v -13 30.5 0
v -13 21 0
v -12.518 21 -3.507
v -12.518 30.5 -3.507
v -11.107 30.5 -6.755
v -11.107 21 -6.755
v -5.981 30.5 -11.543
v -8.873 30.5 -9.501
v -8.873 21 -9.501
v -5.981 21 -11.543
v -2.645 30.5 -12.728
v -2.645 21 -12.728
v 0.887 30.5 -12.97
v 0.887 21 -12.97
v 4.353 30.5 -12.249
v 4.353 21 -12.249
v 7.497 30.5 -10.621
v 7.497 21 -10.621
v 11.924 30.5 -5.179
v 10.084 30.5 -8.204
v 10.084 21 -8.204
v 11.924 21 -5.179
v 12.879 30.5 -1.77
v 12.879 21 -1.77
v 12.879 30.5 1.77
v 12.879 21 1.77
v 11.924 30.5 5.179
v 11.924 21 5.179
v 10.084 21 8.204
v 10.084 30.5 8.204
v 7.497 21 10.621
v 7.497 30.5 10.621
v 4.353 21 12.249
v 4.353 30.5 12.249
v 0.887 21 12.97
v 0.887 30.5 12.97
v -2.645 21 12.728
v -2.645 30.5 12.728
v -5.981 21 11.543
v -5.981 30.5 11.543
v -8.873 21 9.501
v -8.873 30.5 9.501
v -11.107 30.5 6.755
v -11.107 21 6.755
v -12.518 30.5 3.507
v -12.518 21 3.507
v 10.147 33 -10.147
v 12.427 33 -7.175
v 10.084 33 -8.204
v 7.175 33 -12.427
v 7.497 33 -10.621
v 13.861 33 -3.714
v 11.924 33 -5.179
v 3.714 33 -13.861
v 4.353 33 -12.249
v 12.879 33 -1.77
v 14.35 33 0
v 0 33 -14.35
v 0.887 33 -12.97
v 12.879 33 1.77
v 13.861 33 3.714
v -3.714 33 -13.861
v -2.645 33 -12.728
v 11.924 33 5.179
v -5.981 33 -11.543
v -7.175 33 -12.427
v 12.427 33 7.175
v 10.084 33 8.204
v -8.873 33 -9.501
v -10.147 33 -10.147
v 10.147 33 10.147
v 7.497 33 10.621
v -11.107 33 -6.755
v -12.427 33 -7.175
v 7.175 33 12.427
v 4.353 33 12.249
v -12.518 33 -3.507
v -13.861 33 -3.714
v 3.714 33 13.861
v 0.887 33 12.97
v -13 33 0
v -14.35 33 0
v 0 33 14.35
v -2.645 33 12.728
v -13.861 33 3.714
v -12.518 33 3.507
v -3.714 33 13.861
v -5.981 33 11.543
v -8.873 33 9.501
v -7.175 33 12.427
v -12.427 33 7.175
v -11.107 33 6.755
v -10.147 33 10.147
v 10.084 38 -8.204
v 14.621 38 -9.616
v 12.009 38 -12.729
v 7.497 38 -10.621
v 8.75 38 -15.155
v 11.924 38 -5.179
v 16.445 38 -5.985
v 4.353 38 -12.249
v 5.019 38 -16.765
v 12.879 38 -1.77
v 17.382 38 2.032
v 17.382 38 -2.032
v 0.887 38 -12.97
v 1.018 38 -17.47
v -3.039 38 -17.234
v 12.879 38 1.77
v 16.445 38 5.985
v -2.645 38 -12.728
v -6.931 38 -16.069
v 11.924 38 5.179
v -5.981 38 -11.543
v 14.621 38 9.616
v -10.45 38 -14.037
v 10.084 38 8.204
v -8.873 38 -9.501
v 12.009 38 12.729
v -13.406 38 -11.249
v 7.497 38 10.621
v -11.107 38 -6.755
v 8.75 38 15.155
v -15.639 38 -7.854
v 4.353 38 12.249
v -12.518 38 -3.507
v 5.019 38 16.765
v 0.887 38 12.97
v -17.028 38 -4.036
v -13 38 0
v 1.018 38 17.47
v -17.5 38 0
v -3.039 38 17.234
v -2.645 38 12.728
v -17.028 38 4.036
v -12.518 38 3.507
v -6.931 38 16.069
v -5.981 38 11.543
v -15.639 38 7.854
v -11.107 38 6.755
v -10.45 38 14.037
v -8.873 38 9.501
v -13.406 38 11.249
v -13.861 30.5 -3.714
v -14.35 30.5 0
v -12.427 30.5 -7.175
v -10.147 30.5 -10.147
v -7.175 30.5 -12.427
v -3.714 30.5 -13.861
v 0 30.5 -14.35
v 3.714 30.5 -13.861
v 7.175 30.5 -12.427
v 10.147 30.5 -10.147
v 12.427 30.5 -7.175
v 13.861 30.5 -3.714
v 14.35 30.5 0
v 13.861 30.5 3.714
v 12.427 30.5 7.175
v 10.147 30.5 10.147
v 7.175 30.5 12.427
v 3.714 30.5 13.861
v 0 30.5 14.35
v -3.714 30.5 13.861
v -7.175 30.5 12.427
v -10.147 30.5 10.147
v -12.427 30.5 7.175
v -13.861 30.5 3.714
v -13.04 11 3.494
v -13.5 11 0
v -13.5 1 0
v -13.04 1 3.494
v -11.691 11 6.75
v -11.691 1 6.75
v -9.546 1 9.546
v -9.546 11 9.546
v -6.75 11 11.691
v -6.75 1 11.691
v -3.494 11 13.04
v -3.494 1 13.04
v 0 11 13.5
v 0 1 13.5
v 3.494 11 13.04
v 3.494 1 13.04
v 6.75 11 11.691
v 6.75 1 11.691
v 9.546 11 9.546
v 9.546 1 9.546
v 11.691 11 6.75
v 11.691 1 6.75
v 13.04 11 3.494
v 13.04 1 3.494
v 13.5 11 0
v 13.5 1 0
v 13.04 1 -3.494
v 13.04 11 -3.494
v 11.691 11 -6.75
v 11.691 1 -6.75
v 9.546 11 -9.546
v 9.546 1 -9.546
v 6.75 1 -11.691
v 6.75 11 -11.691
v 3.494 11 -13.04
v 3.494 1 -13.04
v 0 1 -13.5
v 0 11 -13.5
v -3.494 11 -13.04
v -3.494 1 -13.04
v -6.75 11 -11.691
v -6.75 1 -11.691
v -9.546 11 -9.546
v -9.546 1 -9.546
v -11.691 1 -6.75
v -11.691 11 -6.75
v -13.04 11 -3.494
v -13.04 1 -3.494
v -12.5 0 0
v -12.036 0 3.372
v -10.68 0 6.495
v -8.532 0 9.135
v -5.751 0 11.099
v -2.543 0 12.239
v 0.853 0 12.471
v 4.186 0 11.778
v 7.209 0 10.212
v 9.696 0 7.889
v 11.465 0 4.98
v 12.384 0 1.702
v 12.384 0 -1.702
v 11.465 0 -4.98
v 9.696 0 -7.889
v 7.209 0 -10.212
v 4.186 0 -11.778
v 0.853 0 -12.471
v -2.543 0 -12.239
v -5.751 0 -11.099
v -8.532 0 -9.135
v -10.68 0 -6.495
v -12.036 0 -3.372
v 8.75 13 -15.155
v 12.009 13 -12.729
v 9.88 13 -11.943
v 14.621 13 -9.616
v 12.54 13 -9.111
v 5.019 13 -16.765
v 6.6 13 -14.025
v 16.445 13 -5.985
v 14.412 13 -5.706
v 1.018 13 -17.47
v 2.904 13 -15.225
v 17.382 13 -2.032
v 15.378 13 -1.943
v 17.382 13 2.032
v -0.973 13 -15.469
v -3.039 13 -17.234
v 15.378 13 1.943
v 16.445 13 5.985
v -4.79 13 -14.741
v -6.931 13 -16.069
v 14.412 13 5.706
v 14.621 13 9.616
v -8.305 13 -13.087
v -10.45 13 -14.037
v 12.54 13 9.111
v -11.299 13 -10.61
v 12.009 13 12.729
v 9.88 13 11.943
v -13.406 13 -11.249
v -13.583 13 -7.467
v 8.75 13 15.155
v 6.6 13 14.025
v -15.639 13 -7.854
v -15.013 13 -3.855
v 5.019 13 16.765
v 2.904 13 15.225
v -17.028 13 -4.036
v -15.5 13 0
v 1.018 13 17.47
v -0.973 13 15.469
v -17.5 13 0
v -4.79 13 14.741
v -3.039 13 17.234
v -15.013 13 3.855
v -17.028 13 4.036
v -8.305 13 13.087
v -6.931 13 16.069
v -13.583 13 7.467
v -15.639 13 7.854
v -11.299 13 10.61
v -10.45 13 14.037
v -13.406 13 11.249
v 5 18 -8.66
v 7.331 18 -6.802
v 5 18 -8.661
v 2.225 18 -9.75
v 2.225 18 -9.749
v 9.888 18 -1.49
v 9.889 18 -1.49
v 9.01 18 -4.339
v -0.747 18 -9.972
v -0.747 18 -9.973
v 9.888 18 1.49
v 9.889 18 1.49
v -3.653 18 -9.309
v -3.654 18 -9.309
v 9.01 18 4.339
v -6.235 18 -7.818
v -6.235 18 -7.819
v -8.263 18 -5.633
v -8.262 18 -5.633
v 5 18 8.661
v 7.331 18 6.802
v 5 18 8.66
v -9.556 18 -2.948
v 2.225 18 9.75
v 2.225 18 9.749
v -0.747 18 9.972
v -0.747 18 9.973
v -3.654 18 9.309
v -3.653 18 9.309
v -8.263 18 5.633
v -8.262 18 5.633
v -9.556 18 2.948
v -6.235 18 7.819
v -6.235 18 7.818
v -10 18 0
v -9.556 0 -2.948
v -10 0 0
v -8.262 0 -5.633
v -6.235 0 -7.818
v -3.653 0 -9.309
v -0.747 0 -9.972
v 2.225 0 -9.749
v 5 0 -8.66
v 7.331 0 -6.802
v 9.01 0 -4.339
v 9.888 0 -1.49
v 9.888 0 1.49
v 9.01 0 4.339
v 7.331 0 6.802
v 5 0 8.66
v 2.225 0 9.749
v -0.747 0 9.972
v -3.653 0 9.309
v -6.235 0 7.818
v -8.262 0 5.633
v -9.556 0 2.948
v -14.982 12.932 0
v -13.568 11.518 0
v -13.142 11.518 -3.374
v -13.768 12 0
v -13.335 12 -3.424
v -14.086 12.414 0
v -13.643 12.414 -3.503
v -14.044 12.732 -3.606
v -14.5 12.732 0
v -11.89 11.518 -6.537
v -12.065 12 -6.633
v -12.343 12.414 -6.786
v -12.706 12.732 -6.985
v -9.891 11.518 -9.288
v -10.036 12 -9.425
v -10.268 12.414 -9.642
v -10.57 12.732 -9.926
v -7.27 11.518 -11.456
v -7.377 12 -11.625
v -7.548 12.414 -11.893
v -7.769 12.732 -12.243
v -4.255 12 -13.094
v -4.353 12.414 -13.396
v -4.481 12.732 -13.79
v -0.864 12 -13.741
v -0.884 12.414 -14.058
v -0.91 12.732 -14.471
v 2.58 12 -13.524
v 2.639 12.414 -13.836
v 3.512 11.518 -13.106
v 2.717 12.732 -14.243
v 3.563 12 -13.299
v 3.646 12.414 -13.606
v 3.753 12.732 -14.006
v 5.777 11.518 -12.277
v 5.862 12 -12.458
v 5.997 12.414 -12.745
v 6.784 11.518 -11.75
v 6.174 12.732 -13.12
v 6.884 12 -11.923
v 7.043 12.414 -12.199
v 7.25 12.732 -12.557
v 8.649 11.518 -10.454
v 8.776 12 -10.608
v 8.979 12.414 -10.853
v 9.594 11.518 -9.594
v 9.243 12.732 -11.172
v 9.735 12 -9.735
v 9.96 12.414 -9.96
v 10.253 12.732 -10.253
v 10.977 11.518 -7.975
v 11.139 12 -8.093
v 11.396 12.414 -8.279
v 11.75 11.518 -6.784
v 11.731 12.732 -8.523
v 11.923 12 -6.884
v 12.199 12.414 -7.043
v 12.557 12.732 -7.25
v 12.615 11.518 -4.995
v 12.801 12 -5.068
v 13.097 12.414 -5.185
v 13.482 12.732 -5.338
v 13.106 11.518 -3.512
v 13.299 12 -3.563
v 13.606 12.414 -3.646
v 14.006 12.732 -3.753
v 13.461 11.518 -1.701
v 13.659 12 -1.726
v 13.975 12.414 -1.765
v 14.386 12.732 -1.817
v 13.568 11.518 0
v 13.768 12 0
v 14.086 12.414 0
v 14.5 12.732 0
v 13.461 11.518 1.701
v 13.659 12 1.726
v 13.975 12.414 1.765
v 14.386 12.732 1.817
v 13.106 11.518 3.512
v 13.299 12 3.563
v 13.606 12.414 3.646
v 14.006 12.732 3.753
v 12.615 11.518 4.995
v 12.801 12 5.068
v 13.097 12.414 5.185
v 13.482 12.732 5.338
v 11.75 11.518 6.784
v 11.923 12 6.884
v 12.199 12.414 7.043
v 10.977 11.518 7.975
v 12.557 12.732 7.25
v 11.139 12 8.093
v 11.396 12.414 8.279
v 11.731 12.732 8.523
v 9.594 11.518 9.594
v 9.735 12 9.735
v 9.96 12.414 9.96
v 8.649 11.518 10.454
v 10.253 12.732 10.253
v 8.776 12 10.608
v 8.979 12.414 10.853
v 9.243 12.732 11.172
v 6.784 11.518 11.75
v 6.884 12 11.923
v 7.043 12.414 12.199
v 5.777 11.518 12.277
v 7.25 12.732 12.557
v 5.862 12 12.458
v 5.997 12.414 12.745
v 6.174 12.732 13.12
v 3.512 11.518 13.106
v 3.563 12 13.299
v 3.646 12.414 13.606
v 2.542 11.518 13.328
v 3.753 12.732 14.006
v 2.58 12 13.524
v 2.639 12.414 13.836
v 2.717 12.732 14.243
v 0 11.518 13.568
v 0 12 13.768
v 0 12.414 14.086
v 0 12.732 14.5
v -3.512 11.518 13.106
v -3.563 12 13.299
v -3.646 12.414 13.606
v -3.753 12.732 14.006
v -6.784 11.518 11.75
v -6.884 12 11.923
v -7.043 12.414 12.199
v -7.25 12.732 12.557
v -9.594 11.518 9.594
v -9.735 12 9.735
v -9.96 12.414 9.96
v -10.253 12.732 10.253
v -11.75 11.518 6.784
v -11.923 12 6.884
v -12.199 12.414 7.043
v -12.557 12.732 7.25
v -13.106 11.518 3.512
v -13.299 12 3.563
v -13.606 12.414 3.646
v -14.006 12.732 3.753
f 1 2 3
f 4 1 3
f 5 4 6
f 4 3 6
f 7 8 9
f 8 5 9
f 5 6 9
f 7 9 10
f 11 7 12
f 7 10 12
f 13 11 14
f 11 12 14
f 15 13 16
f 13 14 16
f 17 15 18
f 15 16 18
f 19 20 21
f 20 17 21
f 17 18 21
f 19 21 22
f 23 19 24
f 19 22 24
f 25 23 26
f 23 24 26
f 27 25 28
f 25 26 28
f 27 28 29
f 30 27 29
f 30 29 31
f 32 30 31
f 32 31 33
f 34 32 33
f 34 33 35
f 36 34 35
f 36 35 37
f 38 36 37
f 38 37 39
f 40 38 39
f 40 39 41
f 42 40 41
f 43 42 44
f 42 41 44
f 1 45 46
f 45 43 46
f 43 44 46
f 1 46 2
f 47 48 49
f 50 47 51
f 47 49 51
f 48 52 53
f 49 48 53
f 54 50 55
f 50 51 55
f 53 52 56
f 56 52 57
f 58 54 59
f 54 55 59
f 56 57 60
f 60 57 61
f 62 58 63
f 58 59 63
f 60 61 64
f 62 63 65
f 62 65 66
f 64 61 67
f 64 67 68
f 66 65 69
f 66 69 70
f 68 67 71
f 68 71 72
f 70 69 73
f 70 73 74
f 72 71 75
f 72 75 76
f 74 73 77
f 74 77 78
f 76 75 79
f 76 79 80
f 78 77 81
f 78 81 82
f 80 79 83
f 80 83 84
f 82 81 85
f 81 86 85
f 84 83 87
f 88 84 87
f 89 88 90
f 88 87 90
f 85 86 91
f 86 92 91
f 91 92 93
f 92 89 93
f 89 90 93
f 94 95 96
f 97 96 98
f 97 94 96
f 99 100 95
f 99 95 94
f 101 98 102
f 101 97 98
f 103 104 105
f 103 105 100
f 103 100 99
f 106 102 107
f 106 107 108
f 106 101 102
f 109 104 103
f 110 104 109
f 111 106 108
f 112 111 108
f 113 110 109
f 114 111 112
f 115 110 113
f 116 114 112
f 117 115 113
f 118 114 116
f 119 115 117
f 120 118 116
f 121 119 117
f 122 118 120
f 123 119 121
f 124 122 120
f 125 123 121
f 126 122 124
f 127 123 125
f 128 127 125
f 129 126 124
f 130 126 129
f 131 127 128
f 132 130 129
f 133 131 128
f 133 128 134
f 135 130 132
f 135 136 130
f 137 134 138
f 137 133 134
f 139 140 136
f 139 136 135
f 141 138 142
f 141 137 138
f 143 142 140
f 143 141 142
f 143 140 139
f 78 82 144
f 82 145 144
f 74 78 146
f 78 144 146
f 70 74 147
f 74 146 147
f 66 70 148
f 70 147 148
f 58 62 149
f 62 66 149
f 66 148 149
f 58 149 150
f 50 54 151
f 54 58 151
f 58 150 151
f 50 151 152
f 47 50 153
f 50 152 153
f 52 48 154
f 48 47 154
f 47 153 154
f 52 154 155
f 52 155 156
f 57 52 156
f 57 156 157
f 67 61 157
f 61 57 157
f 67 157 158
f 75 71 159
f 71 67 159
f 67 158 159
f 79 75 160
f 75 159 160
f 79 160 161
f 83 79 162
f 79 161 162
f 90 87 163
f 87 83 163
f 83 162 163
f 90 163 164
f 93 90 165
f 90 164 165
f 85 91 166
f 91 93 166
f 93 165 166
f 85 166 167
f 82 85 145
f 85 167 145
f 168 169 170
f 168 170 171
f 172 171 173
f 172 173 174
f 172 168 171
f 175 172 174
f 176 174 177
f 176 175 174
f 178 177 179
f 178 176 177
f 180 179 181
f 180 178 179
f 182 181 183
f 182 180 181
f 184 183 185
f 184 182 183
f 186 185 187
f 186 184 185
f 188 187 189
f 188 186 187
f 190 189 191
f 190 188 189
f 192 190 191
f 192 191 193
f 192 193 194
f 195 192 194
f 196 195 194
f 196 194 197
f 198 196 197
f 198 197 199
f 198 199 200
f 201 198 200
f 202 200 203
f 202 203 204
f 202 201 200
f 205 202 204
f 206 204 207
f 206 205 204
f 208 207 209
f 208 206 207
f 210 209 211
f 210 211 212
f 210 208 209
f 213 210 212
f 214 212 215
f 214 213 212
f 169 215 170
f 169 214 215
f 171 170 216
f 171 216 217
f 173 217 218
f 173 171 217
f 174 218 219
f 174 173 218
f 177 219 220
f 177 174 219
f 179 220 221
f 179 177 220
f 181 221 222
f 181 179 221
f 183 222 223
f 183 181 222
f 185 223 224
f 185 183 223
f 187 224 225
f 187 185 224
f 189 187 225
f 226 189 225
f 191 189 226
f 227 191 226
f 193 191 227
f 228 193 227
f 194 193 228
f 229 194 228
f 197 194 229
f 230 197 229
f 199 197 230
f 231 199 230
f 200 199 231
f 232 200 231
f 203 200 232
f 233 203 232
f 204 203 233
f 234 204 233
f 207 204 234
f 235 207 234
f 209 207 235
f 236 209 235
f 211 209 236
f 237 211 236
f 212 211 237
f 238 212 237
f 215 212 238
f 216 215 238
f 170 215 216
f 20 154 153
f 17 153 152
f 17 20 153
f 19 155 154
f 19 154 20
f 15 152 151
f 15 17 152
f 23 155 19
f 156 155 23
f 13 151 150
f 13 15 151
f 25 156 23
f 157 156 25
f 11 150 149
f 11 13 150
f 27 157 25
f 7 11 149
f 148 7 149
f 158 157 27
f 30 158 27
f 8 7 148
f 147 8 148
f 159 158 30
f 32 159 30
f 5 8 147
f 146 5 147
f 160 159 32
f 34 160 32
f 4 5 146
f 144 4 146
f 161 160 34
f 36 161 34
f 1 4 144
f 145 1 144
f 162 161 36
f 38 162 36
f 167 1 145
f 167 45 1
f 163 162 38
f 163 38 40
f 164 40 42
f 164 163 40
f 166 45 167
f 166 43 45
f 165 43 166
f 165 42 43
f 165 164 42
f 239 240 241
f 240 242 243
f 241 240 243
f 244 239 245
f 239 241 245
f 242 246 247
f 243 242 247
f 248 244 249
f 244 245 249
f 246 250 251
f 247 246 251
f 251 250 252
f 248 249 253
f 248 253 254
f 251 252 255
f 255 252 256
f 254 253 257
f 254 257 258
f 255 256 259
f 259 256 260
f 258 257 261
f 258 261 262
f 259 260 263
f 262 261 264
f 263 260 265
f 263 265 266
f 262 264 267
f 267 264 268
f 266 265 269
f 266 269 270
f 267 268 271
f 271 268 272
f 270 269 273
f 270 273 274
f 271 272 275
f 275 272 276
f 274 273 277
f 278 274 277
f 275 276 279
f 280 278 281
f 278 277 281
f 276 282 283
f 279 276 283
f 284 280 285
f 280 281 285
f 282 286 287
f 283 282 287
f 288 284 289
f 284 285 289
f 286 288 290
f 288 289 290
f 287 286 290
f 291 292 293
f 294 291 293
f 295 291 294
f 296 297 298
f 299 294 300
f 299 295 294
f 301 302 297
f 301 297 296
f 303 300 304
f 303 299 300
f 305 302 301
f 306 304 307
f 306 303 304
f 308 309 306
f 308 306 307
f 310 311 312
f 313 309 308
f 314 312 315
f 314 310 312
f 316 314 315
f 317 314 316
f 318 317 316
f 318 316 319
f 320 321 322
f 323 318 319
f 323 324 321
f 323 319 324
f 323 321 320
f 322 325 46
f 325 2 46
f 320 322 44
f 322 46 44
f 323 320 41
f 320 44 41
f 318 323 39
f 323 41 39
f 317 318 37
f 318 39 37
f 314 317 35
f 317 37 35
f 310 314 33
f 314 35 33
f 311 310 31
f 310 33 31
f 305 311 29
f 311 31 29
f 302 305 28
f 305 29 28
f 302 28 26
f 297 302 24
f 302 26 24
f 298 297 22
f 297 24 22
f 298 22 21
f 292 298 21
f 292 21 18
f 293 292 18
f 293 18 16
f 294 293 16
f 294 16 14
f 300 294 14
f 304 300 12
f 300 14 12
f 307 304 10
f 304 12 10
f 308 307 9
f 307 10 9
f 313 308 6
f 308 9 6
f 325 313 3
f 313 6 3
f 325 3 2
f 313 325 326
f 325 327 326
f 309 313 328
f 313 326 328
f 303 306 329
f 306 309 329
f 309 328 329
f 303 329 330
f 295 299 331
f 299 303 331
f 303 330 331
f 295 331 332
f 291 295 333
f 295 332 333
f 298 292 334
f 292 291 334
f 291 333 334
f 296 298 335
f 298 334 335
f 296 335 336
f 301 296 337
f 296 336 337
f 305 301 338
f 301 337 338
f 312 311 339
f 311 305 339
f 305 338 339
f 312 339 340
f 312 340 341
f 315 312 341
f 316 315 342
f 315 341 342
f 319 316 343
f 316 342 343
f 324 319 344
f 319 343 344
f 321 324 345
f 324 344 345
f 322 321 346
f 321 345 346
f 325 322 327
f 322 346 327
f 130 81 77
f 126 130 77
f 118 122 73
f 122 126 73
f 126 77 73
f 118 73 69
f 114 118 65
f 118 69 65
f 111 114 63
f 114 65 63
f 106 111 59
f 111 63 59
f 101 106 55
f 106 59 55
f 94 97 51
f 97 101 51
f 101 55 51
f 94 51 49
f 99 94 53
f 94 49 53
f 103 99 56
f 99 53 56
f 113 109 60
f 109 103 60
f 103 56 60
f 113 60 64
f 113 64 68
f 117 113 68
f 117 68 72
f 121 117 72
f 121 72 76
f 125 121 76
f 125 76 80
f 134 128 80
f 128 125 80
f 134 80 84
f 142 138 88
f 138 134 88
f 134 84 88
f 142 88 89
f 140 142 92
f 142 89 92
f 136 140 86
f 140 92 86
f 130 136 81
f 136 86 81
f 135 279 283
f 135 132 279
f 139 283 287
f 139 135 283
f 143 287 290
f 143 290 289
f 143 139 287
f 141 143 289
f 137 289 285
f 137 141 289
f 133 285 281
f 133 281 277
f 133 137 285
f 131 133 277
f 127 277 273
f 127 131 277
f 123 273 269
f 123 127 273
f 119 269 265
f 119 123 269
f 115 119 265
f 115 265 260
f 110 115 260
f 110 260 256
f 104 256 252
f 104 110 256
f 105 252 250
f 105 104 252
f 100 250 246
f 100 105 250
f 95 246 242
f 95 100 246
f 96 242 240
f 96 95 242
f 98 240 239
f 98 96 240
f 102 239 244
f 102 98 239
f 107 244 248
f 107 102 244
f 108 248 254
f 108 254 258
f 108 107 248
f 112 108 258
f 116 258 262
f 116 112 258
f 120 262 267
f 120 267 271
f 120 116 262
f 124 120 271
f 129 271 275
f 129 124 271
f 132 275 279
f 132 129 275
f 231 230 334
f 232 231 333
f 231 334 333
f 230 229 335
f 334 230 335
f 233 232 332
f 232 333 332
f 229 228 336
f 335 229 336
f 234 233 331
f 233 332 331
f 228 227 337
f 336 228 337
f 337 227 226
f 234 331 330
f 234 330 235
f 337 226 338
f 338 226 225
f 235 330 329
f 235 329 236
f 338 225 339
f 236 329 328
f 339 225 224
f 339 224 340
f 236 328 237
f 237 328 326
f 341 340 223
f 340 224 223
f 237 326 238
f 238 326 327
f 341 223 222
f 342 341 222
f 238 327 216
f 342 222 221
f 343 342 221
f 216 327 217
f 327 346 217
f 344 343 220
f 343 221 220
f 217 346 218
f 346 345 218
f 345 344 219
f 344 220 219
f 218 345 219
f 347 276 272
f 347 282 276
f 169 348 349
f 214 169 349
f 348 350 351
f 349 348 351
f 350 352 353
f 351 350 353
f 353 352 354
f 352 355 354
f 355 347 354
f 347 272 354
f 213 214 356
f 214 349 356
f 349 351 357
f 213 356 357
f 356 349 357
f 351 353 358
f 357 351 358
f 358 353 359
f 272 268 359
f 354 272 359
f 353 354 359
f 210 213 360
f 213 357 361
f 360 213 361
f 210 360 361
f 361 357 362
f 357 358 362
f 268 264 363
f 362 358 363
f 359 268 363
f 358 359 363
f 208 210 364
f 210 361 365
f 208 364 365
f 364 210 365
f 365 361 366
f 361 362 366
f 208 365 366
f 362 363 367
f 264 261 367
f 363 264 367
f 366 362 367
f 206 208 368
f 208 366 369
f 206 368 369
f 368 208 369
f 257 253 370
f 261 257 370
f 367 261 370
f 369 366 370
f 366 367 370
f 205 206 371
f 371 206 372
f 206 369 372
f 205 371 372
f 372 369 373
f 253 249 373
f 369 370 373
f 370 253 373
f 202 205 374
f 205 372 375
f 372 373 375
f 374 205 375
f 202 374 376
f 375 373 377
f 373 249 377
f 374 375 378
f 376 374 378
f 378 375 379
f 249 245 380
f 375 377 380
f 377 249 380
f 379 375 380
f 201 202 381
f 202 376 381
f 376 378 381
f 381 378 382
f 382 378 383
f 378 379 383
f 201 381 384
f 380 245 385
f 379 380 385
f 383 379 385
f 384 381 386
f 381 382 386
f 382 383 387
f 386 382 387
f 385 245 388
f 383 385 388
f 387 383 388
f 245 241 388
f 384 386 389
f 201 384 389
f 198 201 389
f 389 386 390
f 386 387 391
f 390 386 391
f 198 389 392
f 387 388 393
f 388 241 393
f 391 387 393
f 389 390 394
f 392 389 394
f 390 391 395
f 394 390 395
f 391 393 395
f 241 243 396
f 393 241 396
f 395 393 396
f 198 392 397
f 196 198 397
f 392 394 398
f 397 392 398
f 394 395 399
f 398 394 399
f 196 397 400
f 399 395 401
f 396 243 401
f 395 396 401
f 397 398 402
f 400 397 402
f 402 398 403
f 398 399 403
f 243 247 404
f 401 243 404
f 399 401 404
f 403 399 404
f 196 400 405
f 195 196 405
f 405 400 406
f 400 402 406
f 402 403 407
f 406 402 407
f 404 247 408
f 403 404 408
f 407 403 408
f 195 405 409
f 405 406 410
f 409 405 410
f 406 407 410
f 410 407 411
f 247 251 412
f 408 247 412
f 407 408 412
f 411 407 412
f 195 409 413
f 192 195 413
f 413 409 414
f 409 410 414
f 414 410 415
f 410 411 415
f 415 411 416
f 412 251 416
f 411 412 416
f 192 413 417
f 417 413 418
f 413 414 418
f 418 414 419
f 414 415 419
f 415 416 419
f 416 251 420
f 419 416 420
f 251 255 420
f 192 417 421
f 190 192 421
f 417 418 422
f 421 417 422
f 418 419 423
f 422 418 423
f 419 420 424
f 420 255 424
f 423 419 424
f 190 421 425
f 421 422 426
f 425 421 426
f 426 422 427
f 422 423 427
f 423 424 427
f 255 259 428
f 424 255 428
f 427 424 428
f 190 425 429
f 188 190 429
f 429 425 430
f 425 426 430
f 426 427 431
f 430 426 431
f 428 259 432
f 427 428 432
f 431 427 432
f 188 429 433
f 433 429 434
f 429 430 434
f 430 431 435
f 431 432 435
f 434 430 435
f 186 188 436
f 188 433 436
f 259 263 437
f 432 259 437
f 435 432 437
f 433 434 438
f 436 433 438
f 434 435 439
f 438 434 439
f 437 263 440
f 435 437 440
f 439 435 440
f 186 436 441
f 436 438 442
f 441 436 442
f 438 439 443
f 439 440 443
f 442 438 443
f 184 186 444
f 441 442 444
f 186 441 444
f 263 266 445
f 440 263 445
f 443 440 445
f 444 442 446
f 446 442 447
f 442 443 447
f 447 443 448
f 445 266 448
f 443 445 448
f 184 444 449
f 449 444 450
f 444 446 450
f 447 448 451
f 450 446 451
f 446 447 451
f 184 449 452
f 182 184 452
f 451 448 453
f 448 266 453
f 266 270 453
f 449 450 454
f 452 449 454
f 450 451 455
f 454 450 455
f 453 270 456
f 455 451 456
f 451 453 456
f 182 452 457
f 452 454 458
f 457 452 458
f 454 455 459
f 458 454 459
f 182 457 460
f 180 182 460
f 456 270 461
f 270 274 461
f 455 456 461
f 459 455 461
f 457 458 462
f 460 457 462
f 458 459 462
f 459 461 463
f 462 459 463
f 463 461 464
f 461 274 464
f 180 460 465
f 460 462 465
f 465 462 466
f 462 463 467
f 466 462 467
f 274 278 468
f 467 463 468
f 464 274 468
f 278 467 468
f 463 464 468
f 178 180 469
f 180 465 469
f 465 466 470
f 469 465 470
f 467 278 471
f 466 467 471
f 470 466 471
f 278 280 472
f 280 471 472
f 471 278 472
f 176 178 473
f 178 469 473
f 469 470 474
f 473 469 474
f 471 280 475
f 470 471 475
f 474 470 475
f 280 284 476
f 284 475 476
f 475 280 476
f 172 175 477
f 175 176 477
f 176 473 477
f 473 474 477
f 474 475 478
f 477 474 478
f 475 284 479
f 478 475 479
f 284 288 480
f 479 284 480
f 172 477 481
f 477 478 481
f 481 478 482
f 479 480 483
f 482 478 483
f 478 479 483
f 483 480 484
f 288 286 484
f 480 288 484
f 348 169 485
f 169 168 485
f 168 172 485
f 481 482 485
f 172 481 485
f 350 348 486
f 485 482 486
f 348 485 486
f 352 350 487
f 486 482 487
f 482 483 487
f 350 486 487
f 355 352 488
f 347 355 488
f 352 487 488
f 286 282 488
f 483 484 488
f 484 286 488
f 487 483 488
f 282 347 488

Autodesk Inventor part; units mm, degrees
ref_plane "YZ Plane" through (0, 0, 0) normal (1, 0, 0) x (0, 1, 0)
ref_plane "XZ Plane" through (0, 0, 0) normal (0, 1, 0) x (-1, 0, 0)
ref_plane "XY Plane" through (0, 0, 0) normal (0, 0, 1) x (1, 0, 0)
sketch "Sketch1" plane through (0, 0, 0) normal (0, 0, 1) x (1, 0, 0)
  line L0 (0, 0) -> (-13.5, 0)
  line L1 (-13.5, 0) -> (-13.5, 13)
  line L2 (-13.5, 13) -> (-17.5, 13)
  line L3 (-17.5, 13) -> (-17.5, 38)
  line L4 (-17.5, 38) -> (-13, 38)
  line L5 (-13, 38) -> (-13, 33)
  line L6 (-13, 33) -> (-14.35, 33)
  line L7 (-14.35, 33) -> (-14.35, 30.5)
  line L8 (-14.35, 30.5) -> (-13, 30.5)
  line L9 (-13, 30.5) -> (-13, 18)
  line L10 (-13, 18) -> (-10, 18)
  line L11 (-10, 18) -> (-10, 0)
  line L12 (0, 0) -> (0, 38)
  dimension "d0" = 13.5
  dimension "d1" = 13
  dimension "d2" = 4
  dimension "d3" = 25
  dimension "d4" = 4.5
  dimension "d5" = 5
  dimension "d6" = 1.35
  dimension "d7" = 2.5
  dimension "d8" = 12.5
  dimension "d9" = 3
revolve "Revolution1" add sketch "Sketch1" angle 360 about axis through (0, 0, 0) along (0, 1, 0)
fillet "Fillet1" radius 2 1 edges at (13.5, 13, 0)
chamfer "Chamfer1" distance 3 angle 45 1 edges at (13, 18, 0)
chamfer "Chamfer2" distance 1 angle 45 1 edges at (13.5, 0, 0)
thread "Thread1" size "M27x3" class "6g" standard "ANSI Metric M Profile" full length
properties part number "Heated tube-transfer tube connector" material "Polypropylene"
